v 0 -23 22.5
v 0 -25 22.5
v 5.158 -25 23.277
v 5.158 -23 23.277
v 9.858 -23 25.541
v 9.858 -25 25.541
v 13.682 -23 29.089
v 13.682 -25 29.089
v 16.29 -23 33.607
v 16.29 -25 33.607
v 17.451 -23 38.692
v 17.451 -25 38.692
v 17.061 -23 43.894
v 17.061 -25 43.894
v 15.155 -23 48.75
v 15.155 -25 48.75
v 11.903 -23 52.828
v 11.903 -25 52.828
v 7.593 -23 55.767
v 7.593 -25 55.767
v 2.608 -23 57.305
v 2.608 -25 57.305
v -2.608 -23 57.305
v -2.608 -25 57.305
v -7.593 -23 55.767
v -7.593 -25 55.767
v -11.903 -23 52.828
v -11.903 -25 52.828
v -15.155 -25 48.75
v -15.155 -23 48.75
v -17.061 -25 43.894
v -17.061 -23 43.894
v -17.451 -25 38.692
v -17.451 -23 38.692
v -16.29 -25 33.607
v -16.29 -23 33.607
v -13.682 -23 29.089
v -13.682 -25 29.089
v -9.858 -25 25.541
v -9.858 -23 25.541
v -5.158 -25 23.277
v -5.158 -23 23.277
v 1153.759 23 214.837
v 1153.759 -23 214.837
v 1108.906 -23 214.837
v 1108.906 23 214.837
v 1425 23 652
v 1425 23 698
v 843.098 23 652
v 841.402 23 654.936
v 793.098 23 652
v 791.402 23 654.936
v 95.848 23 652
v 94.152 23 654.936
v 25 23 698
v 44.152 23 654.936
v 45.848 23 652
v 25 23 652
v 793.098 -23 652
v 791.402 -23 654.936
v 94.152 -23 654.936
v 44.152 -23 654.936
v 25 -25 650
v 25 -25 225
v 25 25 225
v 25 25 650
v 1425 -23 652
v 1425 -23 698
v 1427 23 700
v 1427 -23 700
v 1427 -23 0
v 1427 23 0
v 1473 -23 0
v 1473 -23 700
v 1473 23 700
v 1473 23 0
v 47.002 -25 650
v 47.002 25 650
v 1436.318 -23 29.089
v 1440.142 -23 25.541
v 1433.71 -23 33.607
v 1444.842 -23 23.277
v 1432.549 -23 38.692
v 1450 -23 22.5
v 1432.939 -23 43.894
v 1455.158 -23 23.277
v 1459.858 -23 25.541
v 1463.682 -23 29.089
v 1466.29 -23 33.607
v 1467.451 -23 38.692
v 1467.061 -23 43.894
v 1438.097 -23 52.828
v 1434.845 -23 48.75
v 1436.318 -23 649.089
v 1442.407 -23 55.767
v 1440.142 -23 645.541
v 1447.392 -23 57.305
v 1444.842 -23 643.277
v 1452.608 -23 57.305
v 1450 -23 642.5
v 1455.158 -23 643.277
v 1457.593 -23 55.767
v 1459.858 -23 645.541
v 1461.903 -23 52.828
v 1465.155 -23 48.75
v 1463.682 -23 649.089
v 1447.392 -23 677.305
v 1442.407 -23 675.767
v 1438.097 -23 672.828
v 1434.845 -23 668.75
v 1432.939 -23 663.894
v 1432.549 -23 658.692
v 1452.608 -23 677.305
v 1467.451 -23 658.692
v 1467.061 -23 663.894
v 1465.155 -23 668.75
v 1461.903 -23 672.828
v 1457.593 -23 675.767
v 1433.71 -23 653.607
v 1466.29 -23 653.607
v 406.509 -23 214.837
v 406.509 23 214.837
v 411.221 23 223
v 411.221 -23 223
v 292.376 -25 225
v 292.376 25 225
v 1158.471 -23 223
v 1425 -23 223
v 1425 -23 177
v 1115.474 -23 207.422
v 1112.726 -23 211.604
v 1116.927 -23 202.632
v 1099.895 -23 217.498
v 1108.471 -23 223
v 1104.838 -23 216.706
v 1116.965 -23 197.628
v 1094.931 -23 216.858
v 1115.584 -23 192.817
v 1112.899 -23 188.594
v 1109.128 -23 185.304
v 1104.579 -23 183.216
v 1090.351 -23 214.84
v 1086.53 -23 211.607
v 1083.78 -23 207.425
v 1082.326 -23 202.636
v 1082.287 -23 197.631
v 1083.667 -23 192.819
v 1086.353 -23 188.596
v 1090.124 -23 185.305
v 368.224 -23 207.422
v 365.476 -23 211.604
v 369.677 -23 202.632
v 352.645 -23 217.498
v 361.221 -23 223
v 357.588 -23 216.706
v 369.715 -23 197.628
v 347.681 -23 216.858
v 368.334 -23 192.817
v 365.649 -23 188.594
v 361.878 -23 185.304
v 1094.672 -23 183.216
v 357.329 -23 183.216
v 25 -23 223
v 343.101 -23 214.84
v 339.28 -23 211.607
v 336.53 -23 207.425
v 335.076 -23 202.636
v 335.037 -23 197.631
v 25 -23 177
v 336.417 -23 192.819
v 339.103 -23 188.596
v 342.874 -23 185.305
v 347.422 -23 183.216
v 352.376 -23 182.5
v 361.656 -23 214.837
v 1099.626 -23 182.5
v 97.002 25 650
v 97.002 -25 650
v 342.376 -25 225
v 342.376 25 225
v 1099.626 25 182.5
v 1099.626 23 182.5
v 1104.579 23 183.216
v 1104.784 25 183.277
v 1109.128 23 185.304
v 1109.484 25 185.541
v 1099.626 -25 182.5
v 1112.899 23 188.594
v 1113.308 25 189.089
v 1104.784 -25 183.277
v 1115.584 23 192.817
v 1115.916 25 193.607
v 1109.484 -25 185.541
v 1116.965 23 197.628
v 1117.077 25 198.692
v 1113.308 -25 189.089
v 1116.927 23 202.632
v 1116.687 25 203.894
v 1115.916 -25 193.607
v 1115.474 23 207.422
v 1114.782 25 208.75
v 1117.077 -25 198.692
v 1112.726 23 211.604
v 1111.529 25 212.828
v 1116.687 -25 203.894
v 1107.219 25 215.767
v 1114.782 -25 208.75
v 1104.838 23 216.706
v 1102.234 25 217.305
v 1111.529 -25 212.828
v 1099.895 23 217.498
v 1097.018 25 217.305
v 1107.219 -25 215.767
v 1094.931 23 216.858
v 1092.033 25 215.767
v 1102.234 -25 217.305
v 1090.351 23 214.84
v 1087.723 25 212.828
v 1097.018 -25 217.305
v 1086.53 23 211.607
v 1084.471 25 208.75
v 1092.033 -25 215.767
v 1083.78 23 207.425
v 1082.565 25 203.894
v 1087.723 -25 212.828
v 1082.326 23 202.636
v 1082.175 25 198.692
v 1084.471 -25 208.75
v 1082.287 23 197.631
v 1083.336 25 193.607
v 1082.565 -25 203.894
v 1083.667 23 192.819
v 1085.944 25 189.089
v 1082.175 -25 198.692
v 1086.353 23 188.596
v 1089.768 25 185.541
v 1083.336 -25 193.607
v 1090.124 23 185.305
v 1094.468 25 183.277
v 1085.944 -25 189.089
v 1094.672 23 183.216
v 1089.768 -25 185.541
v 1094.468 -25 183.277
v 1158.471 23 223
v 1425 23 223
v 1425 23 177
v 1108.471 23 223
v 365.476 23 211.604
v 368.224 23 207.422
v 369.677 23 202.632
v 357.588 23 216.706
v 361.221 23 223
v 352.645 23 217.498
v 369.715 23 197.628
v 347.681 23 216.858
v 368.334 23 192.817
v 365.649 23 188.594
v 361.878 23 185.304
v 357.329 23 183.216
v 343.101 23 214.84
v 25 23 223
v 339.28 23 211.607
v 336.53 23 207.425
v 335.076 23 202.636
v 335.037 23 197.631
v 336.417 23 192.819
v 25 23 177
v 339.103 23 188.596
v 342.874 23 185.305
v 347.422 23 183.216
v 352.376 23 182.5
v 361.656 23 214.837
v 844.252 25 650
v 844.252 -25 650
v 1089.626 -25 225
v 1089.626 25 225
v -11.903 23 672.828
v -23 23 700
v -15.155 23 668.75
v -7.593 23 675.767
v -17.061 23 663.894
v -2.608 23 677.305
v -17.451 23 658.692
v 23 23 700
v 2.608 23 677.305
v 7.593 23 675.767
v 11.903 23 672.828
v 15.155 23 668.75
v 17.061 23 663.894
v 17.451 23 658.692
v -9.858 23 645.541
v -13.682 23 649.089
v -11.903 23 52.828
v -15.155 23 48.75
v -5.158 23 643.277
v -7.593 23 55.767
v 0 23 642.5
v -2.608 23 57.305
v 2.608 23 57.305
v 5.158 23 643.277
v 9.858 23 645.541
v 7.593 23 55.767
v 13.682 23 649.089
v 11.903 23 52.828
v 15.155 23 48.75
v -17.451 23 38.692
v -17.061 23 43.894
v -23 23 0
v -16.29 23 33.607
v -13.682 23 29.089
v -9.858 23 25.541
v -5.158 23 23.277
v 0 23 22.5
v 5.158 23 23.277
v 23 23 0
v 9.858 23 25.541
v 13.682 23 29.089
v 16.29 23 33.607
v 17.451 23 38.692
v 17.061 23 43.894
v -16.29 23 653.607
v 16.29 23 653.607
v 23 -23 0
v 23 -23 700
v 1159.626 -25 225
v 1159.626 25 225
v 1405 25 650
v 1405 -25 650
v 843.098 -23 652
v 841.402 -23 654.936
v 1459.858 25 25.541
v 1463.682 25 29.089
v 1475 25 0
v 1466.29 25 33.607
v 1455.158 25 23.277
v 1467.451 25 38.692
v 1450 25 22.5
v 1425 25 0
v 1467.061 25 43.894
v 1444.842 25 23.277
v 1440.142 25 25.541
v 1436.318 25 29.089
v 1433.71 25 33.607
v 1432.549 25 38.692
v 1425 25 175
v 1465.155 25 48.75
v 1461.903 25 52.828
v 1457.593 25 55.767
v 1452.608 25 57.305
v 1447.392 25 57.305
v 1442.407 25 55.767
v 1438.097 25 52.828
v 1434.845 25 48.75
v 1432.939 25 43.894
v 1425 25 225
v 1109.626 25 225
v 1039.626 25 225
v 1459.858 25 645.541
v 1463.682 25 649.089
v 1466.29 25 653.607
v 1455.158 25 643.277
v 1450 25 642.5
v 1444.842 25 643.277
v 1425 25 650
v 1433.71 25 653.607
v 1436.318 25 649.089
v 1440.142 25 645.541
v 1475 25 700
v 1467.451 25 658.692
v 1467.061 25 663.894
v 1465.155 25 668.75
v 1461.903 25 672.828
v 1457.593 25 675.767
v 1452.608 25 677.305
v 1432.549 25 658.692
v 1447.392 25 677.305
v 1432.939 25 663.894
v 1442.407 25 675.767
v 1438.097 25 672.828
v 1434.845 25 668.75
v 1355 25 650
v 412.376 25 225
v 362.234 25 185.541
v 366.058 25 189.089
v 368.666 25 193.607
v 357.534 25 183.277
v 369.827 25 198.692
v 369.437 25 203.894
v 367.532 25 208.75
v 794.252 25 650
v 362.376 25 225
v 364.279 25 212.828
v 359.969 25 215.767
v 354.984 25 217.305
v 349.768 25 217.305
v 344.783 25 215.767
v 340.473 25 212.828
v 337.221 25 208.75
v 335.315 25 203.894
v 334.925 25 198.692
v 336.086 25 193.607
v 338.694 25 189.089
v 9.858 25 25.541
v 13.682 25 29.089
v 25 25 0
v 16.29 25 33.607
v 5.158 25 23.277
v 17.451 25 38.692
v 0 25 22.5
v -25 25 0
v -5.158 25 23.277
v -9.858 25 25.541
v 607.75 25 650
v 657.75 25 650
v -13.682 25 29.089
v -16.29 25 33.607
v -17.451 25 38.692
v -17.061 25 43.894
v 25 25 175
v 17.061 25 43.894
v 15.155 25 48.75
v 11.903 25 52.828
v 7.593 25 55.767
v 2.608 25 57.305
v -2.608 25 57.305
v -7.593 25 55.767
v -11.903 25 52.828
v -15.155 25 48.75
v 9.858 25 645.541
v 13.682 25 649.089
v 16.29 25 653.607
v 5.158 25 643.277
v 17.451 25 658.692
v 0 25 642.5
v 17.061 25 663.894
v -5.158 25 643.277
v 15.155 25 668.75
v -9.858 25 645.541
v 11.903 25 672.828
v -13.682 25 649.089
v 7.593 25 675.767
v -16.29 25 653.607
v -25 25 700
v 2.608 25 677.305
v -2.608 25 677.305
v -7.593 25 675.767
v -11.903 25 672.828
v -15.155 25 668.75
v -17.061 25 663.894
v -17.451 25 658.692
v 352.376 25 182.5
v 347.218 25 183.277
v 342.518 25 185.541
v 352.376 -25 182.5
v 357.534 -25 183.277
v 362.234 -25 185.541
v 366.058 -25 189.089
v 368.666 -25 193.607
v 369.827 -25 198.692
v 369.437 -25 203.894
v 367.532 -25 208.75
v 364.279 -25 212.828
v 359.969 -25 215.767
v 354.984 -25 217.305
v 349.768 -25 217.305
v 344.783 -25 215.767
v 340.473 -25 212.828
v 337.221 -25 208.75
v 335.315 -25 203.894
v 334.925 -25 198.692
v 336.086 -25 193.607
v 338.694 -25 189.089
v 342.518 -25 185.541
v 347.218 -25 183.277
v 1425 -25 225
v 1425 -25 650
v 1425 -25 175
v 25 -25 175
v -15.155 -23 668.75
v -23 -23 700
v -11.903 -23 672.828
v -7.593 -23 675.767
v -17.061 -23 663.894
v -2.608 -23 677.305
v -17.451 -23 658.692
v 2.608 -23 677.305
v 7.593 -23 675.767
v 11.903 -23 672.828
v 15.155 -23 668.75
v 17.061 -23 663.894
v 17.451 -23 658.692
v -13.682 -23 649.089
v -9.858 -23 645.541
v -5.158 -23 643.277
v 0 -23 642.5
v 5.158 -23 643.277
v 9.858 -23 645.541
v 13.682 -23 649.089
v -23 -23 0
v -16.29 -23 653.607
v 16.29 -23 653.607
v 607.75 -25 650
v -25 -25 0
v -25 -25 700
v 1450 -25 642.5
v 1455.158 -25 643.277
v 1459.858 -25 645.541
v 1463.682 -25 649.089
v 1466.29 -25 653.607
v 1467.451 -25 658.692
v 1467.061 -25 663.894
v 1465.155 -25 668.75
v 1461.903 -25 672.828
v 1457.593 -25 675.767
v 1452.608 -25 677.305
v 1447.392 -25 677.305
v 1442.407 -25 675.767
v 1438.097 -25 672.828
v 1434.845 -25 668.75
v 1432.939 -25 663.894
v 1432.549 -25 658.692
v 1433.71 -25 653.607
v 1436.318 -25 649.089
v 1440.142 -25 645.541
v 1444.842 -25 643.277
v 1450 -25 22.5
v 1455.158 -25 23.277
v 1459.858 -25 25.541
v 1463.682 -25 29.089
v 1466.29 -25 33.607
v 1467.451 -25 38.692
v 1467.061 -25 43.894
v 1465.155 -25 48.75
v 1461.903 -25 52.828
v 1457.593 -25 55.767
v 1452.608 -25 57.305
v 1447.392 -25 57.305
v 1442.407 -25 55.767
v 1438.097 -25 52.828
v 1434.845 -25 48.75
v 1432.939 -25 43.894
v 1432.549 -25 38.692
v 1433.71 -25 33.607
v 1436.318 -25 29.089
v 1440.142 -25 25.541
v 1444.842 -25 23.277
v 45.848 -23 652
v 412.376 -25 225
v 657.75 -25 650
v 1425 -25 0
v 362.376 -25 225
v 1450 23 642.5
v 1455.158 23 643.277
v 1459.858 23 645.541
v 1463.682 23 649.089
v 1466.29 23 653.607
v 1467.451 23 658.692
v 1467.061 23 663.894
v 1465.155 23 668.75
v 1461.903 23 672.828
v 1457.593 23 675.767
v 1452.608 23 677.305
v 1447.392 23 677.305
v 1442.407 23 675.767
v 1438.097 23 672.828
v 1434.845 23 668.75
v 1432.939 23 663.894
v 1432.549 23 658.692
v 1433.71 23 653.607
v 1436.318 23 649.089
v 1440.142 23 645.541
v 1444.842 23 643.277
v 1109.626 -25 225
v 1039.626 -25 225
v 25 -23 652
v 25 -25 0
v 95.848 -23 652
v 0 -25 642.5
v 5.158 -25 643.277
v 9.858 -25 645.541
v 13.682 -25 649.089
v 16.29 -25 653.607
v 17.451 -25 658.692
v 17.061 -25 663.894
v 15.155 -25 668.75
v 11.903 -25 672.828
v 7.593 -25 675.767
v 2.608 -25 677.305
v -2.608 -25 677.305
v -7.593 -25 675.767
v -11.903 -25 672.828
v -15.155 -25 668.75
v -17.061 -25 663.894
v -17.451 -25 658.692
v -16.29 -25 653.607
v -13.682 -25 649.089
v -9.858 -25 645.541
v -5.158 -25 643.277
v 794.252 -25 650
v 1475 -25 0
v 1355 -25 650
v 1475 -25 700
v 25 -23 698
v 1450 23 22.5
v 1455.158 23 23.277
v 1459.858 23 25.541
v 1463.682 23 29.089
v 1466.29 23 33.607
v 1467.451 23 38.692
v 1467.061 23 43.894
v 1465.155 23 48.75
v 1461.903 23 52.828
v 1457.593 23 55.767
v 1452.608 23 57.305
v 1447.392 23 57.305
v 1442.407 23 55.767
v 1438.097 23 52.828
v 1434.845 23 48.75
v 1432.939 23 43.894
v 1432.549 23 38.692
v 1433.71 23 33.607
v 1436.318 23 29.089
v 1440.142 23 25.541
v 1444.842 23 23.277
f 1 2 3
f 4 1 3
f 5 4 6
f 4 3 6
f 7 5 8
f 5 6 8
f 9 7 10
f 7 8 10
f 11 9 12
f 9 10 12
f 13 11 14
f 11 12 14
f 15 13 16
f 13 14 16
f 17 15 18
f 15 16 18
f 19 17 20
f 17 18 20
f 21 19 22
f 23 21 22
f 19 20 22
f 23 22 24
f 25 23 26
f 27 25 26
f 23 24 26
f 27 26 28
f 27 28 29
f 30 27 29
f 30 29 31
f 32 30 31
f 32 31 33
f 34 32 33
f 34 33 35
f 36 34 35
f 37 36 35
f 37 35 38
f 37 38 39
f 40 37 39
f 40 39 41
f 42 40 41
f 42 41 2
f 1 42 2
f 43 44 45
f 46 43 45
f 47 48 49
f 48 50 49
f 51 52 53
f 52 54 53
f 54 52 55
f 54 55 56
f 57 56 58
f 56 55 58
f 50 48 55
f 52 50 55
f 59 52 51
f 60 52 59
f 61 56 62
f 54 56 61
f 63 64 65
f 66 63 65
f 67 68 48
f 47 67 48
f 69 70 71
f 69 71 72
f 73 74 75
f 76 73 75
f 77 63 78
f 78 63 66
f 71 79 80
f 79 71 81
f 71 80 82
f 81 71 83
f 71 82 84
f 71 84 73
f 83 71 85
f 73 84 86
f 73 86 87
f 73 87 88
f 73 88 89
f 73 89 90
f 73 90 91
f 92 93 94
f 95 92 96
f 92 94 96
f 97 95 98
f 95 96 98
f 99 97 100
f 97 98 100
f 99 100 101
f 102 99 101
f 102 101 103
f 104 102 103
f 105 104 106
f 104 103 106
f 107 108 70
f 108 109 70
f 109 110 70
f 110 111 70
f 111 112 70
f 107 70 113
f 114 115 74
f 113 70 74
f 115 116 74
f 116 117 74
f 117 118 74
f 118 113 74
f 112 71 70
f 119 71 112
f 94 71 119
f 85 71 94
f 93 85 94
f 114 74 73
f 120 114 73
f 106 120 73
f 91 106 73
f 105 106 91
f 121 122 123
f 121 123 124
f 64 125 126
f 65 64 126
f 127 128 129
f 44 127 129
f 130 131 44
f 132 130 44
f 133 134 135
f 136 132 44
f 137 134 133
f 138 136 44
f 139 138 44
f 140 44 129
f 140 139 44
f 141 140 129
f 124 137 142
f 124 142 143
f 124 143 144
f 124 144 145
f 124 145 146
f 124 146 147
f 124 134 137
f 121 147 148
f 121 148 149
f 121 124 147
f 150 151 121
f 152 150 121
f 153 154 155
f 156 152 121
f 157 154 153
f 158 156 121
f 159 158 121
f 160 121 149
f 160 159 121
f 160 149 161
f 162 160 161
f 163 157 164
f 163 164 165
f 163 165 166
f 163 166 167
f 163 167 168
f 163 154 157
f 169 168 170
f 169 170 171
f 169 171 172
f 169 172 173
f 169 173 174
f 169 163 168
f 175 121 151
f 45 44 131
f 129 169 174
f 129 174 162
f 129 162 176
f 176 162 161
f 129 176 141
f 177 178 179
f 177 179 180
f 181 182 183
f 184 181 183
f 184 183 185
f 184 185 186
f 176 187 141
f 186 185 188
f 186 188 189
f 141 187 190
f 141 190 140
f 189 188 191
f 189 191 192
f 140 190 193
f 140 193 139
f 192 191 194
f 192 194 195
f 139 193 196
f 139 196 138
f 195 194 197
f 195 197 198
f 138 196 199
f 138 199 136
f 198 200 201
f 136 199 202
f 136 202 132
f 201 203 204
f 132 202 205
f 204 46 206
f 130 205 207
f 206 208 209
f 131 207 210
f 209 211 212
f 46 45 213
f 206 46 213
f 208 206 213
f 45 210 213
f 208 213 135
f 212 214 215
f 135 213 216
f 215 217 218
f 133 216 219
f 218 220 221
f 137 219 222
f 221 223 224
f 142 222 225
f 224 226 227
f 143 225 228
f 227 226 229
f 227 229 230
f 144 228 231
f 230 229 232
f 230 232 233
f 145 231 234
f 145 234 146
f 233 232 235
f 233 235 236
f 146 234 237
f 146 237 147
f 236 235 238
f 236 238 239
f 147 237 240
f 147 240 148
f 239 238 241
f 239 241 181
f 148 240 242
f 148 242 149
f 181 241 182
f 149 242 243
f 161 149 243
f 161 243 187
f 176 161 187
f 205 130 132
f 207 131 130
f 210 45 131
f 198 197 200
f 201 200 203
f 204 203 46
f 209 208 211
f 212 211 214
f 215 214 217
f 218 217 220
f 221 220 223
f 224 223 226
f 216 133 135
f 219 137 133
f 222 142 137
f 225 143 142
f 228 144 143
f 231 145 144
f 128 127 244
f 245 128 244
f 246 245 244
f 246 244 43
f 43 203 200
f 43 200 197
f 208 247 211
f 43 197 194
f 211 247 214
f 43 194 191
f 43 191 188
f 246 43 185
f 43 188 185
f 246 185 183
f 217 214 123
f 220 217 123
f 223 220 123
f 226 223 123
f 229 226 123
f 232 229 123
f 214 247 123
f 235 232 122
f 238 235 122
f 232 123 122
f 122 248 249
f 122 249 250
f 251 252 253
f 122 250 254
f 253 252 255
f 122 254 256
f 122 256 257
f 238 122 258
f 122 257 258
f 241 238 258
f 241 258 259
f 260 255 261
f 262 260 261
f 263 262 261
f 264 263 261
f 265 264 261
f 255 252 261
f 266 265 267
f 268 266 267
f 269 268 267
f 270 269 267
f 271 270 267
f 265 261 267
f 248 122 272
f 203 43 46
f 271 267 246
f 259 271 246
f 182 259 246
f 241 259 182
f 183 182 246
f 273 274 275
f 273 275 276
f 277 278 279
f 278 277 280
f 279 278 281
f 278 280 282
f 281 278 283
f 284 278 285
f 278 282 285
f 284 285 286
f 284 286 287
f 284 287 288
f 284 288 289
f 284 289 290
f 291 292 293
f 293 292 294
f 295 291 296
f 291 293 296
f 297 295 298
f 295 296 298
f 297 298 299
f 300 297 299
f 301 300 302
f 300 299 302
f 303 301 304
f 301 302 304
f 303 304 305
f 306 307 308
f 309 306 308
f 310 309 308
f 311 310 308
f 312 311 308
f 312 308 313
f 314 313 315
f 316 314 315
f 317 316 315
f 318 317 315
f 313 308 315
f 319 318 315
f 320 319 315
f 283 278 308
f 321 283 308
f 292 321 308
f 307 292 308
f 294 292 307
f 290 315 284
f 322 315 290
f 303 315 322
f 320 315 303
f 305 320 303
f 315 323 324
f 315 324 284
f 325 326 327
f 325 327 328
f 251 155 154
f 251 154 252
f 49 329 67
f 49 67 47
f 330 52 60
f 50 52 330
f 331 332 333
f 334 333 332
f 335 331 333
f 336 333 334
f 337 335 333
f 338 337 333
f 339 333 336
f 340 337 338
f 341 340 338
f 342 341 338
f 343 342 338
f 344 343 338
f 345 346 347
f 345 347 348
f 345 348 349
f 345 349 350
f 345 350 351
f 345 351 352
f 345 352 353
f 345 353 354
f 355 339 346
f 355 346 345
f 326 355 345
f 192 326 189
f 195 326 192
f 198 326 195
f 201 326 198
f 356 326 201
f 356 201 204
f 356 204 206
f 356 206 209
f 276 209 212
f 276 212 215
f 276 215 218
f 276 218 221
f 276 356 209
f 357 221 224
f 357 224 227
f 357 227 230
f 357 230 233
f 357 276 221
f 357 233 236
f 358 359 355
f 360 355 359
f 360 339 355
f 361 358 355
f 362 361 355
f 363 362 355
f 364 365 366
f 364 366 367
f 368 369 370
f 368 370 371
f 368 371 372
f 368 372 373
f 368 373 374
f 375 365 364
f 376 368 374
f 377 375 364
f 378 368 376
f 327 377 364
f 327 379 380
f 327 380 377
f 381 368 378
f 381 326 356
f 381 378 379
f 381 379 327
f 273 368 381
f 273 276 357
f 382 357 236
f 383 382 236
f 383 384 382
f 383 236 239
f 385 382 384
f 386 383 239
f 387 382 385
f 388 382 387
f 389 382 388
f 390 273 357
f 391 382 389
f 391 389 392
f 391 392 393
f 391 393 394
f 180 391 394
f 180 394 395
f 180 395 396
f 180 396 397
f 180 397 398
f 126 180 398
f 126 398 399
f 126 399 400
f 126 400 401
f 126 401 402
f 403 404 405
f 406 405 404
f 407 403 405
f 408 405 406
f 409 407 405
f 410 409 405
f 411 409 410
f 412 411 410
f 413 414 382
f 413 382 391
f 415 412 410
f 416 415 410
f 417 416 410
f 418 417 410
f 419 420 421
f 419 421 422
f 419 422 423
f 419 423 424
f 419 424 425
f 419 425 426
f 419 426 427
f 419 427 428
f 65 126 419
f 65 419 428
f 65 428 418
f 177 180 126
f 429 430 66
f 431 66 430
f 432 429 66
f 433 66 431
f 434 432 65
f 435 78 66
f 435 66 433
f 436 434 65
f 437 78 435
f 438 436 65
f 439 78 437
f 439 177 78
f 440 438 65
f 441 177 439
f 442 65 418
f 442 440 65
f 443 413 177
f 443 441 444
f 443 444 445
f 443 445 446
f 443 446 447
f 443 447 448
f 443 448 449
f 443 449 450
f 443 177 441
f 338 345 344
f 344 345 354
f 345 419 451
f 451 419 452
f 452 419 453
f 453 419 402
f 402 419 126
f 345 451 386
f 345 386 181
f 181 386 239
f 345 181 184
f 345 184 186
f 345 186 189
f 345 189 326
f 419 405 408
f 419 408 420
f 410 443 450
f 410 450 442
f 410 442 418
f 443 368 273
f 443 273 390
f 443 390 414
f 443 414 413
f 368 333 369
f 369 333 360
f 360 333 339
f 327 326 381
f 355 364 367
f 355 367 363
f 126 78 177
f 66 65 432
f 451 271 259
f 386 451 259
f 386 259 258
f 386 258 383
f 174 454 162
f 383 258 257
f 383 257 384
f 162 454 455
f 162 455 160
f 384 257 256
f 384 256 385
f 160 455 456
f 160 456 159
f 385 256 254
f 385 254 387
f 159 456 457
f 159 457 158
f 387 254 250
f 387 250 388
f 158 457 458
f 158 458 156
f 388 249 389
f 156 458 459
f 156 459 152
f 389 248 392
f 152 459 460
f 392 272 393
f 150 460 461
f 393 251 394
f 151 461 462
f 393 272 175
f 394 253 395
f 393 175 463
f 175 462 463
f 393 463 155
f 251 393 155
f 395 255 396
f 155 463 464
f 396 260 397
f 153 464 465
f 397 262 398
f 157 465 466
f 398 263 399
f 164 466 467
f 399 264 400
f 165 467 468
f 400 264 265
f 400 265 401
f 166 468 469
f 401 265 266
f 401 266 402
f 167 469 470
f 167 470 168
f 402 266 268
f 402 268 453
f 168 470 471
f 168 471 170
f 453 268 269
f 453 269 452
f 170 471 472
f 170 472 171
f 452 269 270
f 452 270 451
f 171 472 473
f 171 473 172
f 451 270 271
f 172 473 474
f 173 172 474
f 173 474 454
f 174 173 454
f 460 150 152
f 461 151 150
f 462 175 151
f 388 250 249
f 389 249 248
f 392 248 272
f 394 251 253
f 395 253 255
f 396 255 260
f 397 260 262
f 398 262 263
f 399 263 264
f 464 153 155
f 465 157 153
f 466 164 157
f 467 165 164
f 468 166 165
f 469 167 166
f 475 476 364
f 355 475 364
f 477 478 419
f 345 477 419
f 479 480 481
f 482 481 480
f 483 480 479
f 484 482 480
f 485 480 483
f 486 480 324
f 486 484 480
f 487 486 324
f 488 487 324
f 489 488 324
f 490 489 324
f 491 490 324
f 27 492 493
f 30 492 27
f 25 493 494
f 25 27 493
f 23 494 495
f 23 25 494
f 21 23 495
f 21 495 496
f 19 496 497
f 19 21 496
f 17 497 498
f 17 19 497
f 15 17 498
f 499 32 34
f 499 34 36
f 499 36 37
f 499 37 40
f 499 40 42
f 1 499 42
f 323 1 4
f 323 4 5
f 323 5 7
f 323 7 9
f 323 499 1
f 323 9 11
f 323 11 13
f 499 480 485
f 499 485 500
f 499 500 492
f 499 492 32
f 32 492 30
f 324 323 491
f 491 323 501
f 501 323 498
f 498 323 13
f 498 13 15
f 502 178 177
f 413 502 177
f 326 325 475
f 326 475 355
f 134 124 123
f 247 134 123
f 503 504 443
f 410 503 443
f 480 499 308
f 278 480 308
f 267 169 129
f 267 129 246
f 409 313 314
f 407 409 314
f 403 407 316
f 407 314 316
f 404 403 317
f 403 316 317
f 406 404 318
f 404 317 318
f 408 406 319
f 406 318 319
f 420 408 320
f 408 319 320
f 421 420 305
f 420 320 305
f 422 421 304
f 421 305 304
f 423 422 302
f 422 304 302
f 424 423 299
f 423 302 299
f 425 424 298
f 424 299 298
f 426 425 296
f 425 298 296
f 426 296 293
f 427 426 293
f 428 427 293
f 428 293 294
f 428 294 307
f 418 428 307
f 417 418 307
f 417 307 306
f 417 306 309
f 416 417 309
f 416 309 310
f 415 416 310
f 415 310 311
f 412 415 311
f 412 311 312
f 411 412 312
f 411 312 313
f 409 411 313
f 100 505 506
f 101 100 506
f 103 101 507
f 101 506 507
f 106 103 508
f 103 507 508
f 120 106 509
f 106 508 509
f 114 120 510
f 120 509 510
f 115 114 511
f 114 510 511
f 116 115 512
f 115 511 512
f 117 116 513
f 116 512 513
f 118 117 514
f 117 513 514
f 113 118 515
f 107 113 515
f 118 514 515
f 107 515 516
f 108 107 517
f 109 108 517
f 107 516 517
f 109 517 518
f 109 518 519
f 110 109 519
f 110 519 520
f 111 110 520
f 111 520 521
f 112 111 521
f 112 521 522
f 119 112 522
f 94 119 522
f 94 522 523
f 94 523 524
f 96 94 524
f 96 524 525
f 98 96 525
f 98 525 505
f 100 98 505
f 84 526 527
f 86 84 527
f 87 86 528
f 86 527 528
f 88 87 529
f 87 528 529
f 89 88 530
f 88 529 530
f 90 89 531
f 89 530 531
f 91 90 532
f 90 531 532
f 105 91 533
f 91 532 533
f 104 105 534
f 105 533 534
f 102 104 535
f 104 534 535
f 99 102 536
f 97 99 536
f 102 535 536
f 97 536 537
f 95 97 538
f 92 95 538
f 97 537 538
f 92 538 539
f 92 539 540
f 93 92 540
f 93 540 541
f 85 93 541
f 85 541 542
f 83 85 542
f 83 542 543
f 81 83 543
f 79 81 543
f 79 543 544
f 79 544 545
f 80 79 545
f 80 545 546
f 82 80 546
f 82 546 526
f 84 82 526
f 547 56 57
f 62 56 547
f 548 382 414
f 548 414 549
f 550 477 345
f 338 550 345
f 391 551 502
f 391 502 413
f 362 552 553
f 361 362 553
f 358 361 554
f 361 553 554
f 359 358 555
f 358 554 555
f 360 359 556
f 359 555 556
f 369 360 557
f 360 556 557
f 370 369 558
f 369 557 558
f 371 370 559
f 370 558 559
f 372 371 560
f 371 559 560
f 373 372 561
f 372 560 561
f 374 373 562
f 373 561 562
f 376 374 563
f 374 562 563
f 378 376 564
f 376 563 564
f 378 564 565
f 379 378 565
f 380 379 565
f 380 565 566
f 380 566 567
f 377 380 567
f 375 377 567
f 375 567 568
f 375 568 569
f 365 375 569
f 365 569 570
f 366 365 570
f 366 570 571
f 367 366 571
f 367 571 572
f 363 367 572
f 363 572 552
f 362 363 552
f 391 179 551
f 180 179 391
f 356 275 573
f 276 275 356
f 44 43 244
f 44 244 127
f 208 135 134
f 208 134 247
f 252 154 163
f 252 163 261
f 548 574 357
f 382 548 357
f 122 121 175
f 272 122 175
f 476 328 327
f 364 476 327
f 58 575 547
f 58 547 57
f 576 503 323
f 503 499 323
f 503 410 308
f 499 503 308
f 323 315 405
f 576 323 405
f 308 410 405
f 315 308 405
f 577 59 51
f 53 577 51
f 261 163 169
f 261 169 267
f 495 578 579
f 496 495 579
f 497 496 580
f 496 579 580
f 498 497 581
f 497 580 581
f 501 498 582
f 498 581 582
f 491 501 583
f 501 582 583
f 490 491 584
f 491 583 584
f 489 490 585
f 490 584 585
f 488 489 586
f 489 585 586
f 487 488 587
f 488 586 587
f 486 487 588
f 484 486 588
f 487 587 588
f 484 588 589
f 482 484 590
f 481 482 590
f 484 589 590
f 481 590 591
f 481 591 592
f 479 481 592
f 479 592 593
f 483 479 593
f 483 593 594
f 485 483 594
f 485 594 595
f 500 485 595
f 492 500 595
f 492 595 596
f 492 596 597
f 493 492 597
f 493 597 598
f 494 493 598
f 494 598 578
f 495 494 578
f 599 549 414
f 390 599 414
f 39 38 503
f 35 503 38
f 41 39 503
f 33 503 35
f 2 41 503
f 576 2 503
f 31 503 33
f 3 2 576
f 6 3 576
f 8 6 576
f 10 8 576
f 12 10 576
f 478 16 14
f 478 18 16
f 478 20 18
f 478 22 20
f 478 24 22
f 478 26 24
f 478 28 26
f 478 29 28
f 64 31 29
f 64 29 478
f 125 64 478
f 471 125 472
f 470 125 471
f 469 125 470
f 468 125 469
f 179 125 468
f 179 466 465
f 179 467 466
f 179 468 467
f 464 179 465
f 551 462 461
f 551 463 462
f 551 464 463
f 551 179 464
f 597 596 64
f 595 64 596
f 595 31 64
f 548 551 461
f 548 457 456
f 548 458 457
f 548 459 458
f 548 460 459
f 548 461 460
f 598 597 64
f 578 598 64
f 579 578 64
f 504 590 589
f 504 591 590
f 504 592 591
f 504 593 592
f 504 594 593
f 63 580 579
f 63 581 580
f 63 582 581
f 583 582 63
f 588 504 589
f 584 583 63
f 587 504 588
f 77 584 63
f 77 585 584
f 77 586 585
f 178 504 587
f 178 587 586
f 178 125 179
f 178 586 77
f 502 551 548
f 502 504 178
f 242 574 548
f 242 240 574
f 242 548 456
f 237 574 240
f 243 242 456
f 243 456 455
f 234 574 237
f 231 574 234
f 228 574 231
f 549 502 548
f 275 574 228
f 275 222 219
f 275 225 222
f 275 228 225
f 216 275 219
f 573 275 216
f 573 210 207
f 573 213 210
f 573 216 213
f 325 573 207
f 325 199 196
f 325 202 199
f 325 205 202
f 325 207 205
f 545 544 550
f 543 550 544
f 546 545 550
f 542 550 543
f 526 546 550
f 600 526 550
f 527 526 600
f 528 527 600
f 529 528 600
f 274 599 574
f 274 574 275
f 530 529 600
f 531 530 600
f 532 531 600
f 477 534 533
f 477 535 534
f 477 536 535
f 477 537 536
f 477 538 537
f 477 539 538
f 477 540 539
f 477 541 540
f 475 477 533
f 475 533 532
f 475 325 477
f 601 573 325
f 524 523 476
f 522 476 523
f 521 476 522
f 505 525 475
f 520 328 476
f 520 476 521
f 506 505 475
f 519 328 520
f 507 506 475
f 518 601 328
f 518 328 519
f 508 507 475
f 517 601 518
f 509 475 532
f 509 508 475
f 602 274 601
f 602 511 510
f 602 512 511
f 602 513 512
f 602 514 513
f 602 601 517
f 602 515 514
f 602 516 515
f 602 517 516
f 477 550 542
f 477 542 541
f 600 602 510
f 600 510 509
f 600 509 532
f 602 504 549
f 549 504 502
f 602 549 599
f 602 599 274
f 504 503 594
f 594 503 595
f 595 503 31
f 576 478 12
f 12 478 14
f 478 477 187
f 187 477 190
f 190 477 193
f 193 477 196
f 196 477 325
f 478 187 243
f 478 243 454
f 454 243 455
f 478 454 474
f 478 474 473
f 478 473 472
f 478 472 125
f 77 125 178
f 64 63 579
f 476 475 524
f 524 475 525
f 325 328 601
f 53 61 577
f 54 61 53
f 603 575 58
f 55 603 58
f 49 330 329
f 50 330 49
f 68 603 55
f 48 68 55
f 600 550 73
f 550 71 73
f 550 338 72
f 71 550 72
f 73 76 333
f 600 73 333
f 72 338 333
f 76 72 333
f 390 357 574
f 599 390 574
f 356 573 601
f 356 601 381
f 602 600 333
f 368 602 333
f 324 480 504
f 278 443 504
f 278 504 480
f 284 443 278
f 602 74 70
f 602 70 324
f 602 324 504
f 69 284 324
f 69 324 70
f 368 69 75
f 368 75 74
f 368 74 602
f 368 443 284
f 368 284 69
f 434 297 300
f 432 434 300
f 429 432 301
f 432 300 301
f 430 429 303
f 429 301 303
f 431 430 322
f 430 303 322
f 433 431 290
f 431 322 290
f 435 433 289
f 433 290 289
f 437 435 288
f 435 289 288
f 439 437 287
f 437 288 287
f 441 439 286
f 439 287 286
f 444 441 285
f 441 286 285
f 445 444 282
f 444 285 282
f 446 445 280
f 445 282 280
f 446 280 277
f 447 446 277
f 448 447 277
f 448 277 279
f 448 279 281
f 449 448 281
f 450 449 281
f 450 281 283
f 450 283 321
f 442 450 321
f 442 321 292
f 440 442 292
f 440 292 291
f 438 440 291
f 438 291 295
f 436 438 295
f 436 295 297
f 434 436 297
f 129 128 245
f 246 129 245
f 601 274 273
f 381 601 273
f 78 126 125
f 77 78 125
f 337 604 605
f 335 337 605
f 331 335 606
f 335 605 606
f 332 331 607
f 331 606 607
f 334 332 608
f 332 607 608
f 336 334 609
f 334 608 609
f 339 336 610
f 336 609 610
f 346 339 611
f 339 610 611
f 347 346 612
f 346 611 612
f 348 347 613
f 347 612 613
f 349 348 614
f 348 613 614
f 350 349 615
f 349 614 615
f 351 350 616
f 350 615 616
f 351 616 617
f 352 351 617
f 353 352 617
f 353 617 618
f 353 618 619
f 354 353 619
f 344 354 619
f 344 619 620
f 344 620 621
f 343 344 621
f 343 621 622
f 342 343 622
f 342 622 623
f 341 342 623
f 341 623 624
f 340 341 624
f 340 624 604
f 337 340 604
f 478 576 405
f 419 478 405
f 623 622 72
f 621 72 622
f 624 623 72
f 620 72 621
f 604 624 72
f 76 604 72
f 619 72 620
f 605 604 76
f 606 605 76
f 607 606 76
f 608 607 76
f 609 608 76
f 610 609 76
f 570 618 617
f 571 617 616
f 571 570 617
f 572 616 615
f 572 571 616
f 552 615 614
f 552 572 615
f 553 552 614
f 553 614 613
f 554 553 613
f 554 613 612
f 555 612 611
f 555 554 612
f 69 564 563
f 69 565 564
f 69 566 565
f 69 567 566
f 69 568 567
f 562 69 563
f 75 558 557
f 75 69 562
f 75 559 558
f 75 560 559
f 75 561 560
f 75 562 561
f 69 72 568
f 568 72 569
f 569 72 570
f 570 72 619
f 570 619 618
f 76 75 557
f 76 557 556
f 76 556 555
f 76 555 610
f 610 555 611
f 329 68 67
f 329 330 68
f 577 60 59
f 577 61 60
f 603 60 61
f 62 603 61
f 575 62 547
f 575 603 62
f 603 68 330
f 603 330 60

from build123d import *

# Parameters (mm, degrees)
SKETCH1_W           = 50
SKETCH1_H           = 50
SKETCH1_W_2         = 46
SKETCH1_H_2         = 46
EXTRUDE_THIN1_DEPTH = 700
SKETCH2_W           = 50
SKETCH2_H           = 50
SKETCH2_W_2         = 46
SKETCH2_H_2         = 46
BOSS_EXTRUDE1_DEPTH = 1400
SKETCH4_W           = 50
SKETCH4_H           = 50
SKETCH4_W_2         = 46
SKETCH4_H_2         = 46
EXTRUDE_THIN7_DEPTH = 700
SKETCH6_W           = 50
SKETCH6_H           = 50
SKETCH6_W_2         = 46
SKETCH6_H_2         = 46
BOSS_EXTRUDE2_DEPTH = 1400
SKETCH7_W           = 50
SKETCH7_H           = 50
SKETCH11_W          = 50
SKETCH11_H          = 50
LPATTERN1_COUNT     = 2
LPATTERN1_PITCH     = 747.25
SKETCH17_R          = 17.5
CUT_EXTRUDE1_DEPTH  = 1634.439622392
SKETCH18_R          = 17.5
CUT_EXTRUDE2_DEPTH  = 1634.439622392


with BuildPart() as part:
    # Sketch1 → Extrude-Thin1 (new body)
    with BuildSketch(Plane.XY):
        Rectangle(SKETCH1_W, SKETCH1_H)
        Rectangle(SKETCH1_W_2, SKETCH1_H_2, mode=Mode.SUBTRACT)
    extrude(amount=EXTRUDE_THIN1_DEPTH)

    # Sketch2 → Boss-Extrude1 (add)
    with BuildSketch(Plane(origin=(25, 0, 0), x_dir=(0, 0, -1), z_dir=(1, 0, 0))):
        with Locations((-675, 0)):
            Rectangle(SKETCH2_W, SKETCH2_H)
        with Locations((-675, 0)):
            Rectangle(SKETCH2_W_2, SKETCH2_H_2, mode=Mode.SUBTRACT)
    extrude(amount=BOSS_EXTRUDE1_DEPTH)

    # Sketch4 → Extrude-Thin7 (add)
    with BuildSketch(Plane.XY.offset(700)):
        with Locations((1450, 0)):
            Rectangle(SKETCH4_W, SKETCH4_H)
        with Locations((1450, 0)):
            Rectangle(SKETCH4_W_2, SKETCH4_H_2, mode=Mode.SUBTRACT)
    extrude(amount=-EXTRUDE_THIN7_DEPTH)

    # Sketch6 → Boss-Extrude2 (add)
    with BuildSketch(Plane(origin=(25, 0, 0), x_dir=(0, 0, -1), z_dir=(1, 0, 0))):
        with Locations((-200, 0)):
            Rectangle(SKETCH6_W, SKETCH6_H)
        with Locations((-200, 0)):
            Rectangle(SKETCH6_W_2, SKETCH6_H_2, mode=Mode.SUBTRACT)
    extrude(amount=BOSS_EXTRUDE2_DEPTH)

    # Sweep1: sweep along a path in Sketch10
    with BuildLine(Plane(origin=(753.54174377, 0, -435.057528611), x_dir=(0, 1, 0), z_dir=(-0.8660254037844416, 0, 0.49999999999999495))) as sweep1_path:
        Line((-5.323086145, -1252.91651246), (-5.323086145, -750.433692418))
    # Sketch7 → Sweep1 (sweep)
    with BuildSketch(Plane(origin=(0, 0, 650), x_dir=(-1, 0, 0), z_dir=(0, 0, -1))):
        with Locations((-1380, 0)):
            Rectangle(SKETCH7_W, SKETCH7_H)
    sweep1 = sweep(path=sweep1_path.line)

    # Sweep2: sweep along a path in Sketch12
    with BuildLine(Plane(origin=(895.897459622, 0, 517.246639479), x_dir=(0, -1, 0), z_dir=(-0.8660254037844416, 0, -0.49999999999999495))) as sweep2_path:
        Line((0, -337.457351946), (0, 158.99000514))
    # Sketch11 → Sweep2 (sweep)
    with BuildSketch(Plane.XY.offset(225)):
        with Locations((1064.626135594, 0)):
            Rectangle(SKETCH11_W, SKETCH11_H)
    sweep2 = sweep(path=sweep2_path.line)

    # LPattern1: Sweep1, Sweep2 ×2
    with Locations(*[(-i * LPATTERN1_PITCH, 0, 0) for i in range(1, LPATTERN1_COUNT)]):
        add(sweep1)
        add(sweep2)

    # Sketch17 → Cut-Extrude1 (cut, through all)
    with BuildSketch(Plane.XZ.offset(25)):
        with Locations(Location((0, 660, 0), (0, 0, 270))):
            Circle(SKETCH17_R)
        with Locations(Location((0, 40, 0), (0, 0, 270))):
            Circle(SKETCH17_R)
        with Locations(Location((1450, 40, 0), (0, 0, 270))):
            Circle(SKETCH17_R)
        with Locations(Location((1450, 660, 0), (0, 0, 270))):
            Circle(SKETCH17_R)
    extrude(amount=-CUT_EXTRUDE1_DEPTH, mode=Mode.SUBTRACT)

    # Sketch18 → Cut-Extrude2 (cut, through all)
    with BuildSketch(Plane.XZ.offset(25)):
        with Locations(Location((352.376135594, 200, 0), (0, 0, 270))):
            Circle(SKETCH18_R)
        with Locations(Location((1099.626135594, 200, 0), (0, 0, 270))):
            Circle(SKETCH18_R)
    extrude(amount=-CUT_EXTRUDE2_DEPTH, mode=Mode.SUBTRACT)


solid = part.part
